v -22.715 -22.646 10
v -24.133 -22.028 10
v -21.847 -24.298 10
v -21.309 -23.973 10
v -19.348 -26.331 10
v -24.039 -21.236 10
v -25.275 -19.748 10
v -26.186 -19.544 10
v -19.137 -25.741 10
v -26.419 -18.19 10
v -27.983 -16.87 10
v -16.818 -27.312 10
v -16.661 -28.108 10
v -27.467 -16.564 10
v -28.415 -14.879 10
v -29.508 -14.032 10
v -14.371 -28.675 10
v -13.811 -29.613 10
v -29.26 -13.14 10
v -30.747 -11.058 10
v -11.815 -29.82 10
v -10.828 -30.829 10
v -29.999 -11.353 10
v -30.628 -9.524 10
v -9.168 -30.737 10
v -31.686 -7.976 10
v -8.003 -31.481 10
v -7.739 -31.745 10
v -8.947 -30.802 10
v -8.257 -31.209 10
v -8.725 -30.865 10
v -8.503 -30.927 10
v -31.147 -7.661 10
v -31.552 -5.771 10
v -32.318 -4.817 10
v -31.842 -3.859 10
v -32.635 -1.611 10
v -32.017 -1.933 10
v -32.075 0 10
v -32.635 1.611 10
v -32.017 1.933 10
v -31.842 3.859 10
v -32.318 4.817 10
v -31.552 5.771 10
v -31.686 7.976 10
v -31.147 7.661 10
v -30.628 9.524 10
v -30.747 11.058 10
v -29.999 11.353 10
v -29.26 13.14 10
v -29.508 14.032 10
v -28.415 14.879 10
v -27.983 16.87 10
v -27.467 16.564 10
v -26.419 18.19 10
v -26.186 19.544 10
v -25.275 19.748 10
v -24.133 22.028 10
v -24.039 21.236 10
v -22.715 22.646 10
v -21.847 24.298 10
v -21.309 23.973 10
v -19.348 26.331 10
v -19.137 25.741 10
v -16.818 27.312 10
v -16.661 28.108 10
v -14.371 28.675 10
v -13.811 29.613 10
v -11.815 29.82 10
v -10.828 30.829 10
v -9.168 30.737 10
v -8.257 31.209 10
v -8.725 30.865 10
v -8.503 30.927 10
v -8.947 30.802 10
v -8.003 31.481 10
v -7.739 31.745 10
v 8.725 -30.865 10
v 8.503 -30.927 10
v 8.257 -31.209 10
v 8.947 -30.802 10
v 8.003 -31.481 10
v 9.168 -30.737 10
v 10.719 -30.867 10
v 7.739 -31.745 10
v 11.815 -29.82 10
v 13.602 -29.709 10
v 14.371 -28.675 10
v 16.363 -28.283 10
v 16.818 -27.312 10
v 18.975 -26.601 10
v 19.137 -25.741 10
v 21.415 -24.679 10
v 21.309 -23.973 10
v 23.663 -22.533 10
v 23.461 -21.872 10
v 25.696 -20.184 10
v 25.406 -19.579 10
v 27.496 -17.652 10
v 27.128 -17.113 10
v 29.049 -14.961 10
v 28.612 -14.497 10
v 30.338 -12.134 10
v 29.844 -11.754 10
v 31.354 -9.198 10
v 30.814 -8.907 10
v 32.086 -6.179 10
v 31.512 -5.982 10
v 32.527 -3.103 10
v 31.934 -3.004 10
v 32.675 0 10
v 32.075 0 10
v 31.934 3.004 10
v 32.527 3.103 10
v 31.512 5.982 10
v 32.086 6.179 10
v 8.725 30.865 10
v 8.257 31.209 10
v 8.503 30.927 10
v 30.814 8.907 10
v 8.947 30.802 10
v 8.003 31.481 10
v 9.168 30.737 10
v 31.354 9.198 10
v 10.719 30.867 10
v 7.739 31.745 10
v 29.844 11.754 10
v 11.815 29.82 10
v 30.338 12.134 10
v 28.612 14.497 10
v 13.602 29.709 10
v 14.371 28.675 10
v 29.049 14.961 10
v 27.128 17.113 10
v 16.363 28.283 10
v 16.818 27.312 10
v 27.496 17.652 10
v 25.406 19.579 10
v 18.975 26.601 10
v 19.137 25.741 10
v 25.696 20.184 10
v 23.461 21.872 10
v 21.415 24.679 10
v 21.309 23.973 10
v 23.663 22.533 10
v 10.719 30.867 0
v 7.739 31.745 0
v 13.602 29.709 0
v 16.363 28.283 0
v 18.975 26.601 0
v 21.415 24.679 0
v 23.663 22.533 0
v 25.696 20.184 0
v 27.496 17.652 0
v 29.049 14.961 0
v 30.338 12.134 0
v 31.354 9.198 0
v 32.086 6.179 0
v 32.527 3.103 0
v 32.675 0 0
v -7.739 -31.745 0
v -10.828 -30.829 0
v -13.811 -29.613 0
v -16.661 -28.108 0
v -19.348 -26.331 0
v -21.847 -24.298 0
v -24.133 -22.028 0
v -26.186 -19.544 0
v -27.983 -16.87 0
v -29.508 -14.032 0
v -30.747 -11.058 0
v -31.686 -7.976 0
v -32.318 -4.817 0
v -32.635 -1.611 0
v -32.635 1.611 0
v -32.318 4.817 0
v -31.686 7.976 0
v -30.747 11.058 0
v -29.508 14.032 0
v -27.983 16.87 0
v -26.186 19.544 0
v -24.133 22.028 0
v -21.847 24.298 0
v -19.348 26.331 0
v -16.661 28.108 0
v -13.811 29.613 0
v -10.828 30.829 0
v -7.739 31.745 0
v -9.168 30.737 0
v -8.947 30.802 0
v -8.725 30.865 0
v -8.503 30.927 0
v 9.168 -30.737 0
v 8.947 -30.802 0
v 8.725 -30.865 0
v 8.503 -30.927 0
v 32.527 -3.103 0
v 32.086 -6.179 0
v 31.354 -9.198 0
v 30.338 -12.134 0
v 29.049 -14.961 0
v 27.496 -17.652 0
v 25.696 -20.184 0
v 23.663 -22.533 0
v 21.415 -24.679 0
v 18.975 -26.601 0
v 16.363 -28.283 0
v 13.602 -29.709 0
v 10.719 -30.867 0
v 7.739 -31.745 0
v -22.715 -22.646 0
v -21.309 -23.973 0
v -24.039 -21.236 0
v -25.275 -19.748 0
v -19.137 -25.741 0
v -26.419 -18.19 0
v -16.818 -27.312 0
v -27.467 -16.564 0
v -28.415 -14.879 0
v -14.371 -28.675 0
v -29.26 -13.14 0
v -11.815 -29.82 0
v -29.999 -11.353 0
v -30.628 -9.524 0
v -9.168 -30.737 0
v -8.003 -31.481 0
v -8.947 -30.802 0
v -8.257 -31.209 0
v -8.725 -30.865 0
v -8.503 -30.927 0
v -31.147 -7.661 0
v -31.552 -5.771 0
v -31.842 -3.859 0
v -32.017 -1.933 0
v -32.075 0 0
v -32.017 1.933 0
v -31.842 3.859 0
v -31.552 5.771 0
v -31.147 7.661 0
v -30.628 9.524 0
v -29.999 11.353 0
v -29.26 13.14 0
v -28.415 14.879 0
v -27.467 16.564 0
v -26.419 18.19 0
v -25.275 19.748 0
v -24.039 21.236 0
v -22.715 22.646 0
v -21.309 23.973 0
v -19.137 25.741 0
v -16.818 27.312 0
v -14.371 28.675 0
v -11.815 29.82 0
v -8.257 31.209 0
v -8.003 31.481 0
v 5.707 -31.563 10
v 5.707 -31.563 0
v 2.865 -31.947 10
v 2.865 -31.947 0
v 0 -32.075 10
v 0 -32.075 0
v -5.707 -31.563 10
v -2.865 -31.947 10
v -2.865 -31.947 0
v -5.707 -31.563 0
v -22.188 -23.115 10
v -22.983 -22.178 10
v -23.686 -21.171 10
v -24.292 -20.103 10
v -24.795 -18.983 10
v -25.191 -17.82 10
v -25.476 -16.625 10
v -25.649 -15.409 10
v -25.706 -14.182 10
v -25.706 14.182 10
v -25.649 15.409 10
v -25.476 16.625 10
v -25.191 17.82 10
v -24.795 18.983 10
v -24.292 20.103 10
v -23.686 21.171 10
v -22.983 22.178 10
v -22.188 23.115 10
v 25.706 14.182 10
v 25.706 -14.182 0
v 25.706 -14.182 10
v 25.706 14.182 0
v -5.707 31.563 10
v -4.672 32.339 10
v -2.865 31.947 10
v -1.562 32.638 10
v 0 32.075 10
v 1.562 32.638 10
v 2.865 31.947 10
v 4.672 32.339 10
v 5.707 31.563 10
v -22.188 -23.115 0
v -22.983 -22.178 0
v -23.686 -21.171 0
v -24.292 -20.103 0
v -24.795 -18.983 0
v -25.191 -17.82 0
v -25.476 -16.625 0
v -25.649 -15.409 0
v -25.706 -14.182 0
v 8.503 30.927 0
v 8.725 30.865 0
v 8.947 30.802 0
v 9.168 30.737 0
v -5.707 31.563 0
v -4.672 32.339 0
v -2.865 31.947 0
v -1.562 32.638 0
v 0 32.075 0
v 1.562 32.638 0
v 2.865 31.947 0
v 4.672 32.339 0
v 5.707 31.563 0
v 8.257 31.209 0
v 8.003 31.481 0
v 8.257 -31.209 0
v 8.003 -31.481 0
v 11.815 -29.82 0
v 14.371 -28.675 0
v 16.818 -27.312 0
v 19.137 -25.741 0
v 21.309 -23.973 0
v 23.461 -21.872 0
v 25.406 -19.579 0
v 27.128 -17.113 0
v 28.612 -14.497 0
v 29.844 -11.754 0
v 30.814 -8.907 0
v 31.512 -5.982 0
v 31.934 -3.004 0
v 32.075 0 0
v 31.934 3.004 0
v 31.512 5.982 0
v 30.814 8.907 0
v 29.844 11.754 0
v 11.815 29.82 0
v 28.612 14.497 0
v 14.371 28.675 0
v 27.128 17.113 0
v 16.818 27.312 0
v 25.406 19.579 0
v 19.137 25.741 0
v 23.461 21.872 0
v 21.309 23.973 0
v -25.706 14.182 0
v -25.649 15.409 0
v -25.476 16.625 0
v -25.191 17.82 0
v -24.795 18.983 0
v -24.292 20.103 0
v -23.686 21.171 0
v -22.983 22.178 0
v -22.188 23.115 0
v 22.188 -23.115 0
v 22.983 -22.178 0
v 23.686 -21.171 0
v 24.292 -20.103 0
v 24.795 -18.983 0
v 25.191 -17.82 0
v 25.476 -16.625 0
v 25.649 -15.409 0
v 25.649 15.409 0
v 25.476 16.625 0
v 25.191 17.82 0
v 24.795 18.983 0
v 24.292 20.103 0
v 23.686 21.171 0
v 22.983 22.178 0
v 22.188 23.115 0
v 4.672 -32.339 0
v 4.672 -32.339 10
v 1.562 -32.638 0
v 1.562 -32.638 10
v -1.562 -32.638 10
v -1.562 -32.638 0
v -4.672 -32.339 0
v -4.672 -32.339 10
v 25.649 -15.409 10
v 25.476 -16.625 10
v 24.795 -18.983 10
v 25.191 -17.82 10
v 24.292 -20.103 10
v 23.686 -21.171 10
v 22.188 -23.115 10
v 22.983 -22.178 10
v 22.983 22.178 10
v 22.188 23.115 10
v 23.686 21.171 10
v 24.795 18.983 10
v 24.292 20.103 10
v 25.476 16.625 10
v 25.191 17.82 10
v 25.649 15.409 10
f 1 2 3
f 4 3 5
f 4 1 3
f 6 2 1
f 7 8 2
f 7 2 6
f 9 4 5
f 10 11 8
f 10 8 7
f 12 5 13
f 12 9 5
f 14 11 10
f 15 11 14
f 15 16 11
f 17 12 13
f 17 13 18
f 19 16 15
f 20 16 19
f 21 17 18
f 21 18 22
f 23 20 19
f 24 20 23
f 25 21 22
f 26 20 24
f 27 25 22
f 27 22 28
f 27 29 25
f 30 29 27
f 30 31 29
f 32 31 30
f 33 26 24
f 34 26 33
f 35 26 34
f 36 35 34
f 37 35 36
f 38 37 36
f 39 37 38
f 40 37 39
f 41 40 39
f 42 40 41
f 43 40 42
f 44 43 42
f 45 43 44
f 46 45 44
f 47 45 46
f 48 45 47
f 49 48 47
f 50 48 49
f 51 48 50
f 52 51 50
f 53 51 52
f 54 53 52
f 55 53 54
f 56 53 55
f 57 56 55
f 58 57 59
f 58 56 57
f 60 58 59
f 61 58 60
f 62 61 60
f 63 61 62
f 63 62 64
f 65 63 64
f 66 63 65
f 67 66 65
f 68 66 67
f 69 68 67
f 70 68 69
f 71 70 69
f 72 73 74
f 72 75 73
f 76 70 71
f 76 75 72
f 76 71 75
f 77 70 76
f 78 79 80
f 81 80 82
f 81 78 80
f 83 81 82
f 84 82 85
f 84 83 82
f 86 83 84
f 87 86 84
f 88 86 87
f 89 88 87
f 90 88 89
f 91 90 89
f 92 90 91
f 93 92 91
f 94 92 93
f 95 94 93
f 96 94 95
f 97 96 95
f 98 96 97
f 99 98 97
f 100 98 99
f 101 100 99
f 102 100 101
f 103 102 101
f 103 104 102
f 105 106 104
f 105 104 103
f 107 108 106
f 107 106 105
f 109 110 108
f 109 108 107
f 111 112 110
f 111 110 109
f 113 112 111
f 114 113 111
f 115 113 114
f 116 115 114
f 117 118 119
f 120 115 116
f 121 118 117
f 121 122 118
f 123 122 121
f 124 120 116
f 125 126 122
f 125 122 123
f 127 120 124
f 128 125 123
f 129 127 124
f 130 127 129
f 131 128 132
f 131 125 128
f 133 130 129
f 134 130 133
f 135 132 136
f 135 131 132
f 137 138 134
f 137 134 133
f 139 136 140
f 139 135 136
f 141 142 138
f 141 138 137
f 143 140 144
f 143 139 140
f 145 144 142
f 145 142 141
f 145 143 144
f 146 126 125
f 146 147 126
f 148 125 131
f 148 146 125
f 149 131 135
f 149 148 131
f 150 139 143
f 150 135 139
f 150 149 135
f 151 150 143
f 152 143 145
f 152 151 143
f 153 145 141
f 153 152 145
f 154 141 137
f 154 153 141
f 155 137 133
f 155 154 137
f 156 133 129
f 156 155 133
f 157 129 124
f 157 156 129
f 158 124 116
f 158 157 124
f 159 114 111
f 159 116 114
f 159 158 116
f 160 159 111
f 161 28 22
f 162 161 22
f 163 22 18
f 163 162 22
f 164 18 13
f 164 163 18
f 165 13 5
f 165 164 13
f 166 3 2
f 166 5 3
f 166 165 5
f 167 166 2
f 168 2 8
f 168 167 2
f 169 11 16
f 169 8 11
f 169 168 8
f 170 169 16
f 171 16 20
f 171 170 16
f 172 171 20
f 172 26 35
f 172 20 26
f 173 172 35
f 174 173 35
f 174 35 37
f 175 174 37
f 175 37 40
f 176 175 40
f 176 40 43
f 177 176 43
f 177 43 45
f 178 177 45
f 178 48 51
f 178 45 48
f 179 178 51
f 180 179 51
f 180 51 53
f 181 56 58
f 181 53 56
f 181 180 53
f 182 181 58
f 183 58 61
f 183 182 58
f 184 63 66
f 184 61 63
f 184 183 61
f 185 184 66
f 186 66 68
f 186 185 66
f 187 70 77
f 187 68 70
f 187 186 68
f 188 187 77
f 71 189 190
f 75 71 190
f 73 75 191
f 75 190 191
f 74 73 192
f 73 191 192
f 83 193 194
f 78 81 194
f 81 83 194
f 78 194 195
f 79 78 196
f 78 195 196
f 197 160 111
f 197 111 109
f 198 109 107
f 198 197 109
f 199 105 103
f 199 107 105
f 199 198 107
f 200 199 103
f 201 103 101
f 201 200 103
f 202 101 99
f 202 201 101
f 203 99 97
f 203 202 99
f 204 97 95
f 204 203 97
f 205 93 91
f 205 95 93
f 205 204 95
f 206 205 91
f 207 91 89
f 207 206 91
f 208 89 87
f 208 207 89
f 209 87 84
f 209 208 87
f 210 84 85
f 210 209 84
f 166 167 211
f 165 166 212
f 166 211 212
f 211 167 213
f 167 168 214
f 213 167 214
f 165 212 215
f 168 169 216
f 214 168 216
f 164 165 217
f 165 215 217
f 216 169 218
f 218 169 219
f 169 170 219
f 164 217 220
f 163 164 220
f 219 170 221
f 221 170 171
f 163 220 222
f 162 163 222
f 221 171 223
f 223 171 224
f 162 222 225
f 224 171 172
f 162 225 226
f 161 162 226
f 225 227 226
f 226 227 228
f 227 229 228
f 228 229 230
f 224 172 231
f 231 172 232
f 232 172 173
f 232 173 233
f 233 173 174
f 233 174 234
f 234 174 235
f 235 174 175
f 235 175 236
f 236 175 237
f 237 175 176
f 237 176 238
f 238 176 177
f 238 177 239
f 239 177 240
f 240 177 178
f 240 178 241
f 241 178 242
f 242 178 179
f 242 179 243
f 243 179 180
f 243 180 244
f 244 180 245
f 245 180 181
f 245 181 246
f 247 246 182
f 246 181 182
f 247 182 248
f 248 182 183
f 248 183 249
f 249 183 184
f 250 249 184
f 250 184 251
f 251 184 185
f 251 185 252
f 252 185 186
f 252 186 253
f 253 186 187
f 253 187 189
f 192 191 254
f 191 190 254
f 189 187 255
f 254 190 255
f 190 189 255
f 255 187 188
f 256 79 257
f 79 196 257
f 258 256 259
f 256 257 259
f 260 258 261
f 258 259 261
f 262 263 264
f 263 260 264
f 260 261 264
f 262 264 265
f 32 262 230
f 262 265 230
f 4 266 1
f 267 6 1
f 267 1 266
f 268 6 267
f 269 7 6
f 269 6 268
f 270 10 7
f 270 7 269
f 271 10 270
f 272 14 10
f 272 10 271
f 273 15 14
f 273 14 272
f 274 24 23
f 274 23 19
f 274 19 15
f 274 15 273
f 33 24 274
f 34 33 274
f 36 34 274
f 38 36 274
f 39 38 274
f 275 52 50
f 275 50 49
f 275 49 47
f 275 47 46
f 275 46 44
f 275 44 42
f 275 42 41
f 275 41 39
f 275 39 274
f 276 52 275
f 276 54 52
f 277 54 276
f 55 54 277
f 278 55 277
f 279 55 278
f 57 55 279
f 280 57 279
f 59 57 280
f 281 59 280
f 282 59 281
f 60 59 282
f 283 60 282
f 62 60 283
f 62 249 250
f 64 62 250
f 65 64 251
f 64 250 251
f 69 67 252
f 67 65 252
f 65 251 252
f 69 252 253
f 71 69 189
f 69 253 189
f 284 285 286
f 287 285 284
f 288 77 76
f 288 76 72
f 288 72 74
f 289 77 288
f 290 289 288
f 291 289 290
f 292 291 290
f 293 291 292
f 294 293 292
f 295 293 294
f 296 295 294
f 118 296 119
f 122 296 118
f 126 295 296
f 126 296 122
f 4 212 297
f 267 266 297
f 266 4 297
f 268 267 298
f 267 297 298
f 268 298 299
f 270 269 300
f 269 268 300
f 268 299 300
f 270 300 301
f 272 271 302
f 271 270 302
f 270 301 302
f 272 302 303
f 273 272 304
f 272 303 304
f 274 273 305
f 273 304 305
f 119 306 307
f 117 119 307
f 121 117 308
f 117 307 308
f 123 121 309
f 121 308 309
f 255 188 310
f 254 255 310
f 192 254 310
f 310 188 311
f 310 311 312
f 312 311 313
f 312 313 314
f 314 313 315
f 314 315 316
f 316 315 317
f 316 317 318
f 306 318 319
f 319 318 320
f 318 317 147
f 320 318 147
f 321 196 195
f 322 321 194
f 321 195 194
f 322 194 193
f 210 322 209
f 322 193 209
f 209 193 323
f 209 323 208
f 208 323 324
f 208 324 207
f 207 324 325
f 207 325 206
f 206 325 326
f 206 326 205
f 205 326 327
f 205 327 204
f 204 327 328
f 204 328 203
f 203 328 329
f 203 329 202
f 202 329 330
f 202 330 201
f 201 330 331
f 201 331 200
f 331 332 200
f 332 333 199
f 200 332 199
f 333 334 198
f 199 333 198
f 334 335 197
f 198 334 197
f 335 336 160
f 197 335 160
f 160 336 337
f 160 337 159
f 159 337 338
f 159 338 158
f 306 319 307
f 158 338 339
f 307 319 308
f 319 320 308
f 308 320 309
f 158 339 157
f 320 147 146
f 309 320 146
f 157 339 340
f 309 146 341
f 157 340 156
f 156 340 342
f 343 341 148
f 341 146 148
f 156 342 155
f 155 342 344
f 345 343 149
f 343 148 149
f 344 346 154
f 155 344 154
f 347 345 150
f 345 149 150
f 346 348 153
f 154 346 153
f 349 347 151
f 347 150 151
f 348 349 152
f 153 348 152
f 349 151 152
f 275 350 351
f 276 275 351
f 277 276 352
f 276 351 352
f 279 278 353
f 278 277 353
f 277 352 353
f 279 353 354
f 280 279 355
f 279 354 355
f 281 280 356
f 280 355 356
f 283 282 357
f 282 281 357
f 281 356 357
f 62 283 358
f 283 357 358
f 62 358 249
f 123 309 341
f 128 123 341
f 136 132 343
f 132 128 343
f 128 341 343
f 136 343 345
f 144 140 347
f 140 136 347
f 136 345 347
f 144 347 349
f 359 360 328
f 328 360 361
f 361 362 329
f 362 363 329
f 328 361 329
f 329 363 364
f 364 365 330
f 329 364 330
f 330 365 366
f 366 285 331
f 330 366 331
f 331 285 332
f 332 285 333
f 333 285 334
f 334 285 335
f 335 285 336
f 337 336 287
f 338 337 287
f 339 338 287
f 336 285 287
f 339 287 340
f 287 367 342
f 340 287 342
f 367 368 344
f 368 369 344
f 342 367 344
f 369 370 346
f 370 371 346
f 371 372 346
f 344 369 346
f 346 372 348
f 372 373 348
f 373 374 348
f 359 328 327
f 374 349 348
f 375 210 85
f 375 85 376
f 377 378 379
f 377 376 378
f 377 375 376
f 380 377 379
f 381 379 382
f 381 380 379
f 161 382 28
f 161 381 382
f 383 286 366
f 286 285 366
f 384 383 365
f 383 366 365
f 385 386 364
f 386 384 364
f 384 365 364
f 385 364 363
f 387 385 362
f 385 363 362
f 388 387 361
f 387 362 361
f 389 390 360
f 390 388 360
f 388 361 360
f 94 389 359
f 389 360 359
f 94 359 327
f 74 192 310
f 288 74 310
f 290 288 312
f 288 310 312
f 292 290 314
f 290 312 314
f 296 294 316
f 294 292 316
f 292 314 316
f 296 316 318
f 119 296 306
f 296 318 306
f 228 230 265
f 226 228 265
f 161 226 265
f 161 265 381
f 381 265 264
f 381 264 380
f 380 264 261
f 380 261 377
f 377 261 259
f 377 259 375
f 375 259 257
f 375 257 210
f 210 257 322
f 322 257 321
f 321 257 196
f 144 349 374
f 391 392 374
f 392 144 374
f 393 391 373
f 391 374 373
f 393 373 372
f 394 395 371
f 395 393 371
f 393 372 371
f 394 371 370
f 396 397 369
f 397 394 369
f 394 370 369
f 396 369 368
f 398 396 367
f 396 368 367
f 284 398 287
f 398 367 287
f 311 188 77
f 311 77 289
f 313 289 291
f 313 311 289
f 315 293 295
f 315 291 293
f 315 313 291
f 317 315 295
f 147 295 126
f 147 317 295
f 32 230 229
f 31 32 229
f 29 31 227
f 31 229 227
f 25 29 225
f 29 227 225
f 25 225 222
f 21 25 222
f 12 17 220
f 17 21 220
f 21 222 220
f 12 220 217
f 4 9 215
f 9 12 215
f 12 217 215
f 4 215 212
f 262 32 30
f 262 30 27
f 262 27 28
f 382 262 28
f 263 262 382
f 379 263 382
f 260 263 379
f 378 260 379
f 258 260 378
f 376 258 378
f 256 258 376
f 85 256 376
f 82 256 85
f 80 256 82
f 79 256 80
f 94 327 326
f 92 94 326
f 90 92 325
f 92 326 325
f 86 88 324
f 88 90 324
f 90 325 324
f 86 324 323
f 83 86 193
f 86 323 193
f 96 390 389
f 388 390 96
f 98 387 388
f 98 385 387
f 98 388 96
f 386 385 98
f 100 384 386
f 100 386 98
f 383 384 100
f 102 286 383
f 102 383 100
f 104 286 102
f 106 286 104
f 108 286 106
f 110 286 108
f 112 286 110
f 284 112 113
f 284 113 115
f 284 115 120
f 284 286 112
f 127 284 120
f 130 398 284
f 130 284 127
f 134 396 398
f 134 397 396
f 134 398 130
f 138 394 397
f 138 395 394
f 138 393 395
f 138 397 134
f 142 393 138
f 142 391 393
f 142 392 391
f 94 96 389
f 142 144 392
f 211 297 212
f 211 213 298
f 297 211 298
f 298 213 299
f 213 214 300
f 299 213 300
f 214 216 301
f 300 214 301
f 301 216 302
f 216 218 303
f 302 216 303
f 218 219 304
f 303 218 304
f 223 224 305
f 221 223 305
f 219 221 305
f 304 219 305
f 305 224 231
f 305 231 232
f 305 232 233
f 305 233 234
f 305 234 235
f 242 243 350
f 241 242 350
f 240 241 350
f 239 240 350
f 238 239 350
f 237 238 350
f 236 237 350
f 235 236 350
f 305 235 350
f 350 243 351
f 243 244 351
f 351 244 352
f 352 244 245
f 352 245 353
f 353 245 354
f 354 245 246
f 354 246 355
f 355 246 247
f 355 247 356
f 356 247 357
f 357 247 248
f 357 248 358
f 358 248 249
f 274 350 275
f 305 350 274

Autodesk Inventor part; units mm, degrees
ref_plane "YZ Plane" through (0, 0, 0) normal (1, 0, 0) x (0, 1, 0)
ref_plane "XZ Plane" through (0, 0, 0) normal (0, 1, 0) x (-1, 0, 0)
sketch "Sketch1" plane through (0, 0, 0) normal (0, 0, 1) x (1, 0, 0)
  arc A0 (8.9281, 30.3907) -> (-8.9281, 30.3907) centre (0, 23.7533) ccw projected
  arc A1 (21.0435, 23.6744) -> (8.9281, 30.3907) centre (0, 0) ccw projected
  arc A2 (25.3062, 14.1822) -> (21.0435, 23.6744) centre (12.6062, 14.1822) ccw projected
  line L0 (25.3062, 14.1822) -> (25.3062, -14.1822) projected
  arc A3 (21.0435, -23.6744) -> (25.3062, -14.1822) centre (12.6062, -14.1822) ccw construction
  arc A4 (8.9281, -30.3907) -> (21.0435, -23.6744) centre (0, 0) ccw projected
  arc A5 (-8.9281, -30.3907) -> (8.9281, -30.3907) centre (0, -23.7533) ccw projected
  arc A6 (-21.0435, -23.6744) -> (-8.9281, -30.3907) centre (0, 0) ccw projected
  arc A7 (-25.3062, -14.1822) -> (-21.0435, -23.6744) centre (-12.6062, -14.1822) ccw projected
  line L1 (-25.3062, -14.1822) -> (-25.3062, 14.1822) projected
  arc A8 (-21.0435, 23.6744) -> (-25.3062, 14.1822) centre (-12.6062, 14.1822) ccw projected
  arc A9 (-8.9281, 30.3907) -> (-21.0435, 23.6744) centre (0, 0) ccw projected
  circle A10 centre (0, 0) radius 35.025 projected
  circle A11 centre (0, 0) radius 31.675 construction
  line L2 (25.7062, -14.1822) -> (25.7062, 14.1822)
  arc A12 (25.7062, 14.1822) -> (21.3093, 23.9733) centre (12.6062, 14.1822) ccw
  arc A13 (21.3093, 23.9733) -> (9.1683, 30.7368) centre (0, 0) ccw
  arc A14 (9.1683, 30.7368) -> (-9.1683, 30.7368) centre (0, 23.7533) ccw construction
  arc A15 (-9.1683, 30.7368) -> (-21.3093, 23.9733) centre (0, 0) ccw
  arc A16 (-21.3093, 23.9733) -> (-25.7062, 14.1822) centre (-12.6062, 14.1822) ccw
  line L3 (-25.7062, 14.1822) -> (-25.7062, -14.1822)
  arc A17 (-25.7062, -14.1822) -> (-21.3093, -23.9733) centre (-12.6062, -14.1822) ccw
  arc A18 (-21.3093, -23.9733) -> (-9.1683, -30.7368) centre (0, 0) ccw
  arc A19 (-9.1683, -30.7368) -> (9.1683, -30.7368) centre (0, -23.7533) ccw construction
  arc A20 (9.1683, -30.7368) -> (21.3093, -23.9733) centre (0, 0) ccw
  arc A21 (21.3093, -23.9733) -> (25.7062, -14.1822) centre (12.6062, -14.1822) ccw
  circle A22 centre (0, 0) radius 32.675
  circle A23 centre (0, 0) radius 32.075
  point P0 (-9.1683, -30.7368)
  point P1 (-9.1683, 30.7368)
  point P2 (9.1683, 30.7368)
  dimension "d20" = 0.4
  dimension "d21" = 1
ref_plane "Work Plane1" through (-72.8034, -89.1781, 10) normal (0, 0, 1) x (0.7418, 0.6706, 0)
extrude "Extrusion1" add sketch "Sketch1" along normal up to surface (10 mm away) contours A23 A0 A22 | A0 A22 A5 A23 A20 A13 | A23 A15 A18 A5 A22 A0 | A23 A21 L2 A12 | A5 A23 A22 | A16 L3 A17 A23
properties part number "encoderring"
